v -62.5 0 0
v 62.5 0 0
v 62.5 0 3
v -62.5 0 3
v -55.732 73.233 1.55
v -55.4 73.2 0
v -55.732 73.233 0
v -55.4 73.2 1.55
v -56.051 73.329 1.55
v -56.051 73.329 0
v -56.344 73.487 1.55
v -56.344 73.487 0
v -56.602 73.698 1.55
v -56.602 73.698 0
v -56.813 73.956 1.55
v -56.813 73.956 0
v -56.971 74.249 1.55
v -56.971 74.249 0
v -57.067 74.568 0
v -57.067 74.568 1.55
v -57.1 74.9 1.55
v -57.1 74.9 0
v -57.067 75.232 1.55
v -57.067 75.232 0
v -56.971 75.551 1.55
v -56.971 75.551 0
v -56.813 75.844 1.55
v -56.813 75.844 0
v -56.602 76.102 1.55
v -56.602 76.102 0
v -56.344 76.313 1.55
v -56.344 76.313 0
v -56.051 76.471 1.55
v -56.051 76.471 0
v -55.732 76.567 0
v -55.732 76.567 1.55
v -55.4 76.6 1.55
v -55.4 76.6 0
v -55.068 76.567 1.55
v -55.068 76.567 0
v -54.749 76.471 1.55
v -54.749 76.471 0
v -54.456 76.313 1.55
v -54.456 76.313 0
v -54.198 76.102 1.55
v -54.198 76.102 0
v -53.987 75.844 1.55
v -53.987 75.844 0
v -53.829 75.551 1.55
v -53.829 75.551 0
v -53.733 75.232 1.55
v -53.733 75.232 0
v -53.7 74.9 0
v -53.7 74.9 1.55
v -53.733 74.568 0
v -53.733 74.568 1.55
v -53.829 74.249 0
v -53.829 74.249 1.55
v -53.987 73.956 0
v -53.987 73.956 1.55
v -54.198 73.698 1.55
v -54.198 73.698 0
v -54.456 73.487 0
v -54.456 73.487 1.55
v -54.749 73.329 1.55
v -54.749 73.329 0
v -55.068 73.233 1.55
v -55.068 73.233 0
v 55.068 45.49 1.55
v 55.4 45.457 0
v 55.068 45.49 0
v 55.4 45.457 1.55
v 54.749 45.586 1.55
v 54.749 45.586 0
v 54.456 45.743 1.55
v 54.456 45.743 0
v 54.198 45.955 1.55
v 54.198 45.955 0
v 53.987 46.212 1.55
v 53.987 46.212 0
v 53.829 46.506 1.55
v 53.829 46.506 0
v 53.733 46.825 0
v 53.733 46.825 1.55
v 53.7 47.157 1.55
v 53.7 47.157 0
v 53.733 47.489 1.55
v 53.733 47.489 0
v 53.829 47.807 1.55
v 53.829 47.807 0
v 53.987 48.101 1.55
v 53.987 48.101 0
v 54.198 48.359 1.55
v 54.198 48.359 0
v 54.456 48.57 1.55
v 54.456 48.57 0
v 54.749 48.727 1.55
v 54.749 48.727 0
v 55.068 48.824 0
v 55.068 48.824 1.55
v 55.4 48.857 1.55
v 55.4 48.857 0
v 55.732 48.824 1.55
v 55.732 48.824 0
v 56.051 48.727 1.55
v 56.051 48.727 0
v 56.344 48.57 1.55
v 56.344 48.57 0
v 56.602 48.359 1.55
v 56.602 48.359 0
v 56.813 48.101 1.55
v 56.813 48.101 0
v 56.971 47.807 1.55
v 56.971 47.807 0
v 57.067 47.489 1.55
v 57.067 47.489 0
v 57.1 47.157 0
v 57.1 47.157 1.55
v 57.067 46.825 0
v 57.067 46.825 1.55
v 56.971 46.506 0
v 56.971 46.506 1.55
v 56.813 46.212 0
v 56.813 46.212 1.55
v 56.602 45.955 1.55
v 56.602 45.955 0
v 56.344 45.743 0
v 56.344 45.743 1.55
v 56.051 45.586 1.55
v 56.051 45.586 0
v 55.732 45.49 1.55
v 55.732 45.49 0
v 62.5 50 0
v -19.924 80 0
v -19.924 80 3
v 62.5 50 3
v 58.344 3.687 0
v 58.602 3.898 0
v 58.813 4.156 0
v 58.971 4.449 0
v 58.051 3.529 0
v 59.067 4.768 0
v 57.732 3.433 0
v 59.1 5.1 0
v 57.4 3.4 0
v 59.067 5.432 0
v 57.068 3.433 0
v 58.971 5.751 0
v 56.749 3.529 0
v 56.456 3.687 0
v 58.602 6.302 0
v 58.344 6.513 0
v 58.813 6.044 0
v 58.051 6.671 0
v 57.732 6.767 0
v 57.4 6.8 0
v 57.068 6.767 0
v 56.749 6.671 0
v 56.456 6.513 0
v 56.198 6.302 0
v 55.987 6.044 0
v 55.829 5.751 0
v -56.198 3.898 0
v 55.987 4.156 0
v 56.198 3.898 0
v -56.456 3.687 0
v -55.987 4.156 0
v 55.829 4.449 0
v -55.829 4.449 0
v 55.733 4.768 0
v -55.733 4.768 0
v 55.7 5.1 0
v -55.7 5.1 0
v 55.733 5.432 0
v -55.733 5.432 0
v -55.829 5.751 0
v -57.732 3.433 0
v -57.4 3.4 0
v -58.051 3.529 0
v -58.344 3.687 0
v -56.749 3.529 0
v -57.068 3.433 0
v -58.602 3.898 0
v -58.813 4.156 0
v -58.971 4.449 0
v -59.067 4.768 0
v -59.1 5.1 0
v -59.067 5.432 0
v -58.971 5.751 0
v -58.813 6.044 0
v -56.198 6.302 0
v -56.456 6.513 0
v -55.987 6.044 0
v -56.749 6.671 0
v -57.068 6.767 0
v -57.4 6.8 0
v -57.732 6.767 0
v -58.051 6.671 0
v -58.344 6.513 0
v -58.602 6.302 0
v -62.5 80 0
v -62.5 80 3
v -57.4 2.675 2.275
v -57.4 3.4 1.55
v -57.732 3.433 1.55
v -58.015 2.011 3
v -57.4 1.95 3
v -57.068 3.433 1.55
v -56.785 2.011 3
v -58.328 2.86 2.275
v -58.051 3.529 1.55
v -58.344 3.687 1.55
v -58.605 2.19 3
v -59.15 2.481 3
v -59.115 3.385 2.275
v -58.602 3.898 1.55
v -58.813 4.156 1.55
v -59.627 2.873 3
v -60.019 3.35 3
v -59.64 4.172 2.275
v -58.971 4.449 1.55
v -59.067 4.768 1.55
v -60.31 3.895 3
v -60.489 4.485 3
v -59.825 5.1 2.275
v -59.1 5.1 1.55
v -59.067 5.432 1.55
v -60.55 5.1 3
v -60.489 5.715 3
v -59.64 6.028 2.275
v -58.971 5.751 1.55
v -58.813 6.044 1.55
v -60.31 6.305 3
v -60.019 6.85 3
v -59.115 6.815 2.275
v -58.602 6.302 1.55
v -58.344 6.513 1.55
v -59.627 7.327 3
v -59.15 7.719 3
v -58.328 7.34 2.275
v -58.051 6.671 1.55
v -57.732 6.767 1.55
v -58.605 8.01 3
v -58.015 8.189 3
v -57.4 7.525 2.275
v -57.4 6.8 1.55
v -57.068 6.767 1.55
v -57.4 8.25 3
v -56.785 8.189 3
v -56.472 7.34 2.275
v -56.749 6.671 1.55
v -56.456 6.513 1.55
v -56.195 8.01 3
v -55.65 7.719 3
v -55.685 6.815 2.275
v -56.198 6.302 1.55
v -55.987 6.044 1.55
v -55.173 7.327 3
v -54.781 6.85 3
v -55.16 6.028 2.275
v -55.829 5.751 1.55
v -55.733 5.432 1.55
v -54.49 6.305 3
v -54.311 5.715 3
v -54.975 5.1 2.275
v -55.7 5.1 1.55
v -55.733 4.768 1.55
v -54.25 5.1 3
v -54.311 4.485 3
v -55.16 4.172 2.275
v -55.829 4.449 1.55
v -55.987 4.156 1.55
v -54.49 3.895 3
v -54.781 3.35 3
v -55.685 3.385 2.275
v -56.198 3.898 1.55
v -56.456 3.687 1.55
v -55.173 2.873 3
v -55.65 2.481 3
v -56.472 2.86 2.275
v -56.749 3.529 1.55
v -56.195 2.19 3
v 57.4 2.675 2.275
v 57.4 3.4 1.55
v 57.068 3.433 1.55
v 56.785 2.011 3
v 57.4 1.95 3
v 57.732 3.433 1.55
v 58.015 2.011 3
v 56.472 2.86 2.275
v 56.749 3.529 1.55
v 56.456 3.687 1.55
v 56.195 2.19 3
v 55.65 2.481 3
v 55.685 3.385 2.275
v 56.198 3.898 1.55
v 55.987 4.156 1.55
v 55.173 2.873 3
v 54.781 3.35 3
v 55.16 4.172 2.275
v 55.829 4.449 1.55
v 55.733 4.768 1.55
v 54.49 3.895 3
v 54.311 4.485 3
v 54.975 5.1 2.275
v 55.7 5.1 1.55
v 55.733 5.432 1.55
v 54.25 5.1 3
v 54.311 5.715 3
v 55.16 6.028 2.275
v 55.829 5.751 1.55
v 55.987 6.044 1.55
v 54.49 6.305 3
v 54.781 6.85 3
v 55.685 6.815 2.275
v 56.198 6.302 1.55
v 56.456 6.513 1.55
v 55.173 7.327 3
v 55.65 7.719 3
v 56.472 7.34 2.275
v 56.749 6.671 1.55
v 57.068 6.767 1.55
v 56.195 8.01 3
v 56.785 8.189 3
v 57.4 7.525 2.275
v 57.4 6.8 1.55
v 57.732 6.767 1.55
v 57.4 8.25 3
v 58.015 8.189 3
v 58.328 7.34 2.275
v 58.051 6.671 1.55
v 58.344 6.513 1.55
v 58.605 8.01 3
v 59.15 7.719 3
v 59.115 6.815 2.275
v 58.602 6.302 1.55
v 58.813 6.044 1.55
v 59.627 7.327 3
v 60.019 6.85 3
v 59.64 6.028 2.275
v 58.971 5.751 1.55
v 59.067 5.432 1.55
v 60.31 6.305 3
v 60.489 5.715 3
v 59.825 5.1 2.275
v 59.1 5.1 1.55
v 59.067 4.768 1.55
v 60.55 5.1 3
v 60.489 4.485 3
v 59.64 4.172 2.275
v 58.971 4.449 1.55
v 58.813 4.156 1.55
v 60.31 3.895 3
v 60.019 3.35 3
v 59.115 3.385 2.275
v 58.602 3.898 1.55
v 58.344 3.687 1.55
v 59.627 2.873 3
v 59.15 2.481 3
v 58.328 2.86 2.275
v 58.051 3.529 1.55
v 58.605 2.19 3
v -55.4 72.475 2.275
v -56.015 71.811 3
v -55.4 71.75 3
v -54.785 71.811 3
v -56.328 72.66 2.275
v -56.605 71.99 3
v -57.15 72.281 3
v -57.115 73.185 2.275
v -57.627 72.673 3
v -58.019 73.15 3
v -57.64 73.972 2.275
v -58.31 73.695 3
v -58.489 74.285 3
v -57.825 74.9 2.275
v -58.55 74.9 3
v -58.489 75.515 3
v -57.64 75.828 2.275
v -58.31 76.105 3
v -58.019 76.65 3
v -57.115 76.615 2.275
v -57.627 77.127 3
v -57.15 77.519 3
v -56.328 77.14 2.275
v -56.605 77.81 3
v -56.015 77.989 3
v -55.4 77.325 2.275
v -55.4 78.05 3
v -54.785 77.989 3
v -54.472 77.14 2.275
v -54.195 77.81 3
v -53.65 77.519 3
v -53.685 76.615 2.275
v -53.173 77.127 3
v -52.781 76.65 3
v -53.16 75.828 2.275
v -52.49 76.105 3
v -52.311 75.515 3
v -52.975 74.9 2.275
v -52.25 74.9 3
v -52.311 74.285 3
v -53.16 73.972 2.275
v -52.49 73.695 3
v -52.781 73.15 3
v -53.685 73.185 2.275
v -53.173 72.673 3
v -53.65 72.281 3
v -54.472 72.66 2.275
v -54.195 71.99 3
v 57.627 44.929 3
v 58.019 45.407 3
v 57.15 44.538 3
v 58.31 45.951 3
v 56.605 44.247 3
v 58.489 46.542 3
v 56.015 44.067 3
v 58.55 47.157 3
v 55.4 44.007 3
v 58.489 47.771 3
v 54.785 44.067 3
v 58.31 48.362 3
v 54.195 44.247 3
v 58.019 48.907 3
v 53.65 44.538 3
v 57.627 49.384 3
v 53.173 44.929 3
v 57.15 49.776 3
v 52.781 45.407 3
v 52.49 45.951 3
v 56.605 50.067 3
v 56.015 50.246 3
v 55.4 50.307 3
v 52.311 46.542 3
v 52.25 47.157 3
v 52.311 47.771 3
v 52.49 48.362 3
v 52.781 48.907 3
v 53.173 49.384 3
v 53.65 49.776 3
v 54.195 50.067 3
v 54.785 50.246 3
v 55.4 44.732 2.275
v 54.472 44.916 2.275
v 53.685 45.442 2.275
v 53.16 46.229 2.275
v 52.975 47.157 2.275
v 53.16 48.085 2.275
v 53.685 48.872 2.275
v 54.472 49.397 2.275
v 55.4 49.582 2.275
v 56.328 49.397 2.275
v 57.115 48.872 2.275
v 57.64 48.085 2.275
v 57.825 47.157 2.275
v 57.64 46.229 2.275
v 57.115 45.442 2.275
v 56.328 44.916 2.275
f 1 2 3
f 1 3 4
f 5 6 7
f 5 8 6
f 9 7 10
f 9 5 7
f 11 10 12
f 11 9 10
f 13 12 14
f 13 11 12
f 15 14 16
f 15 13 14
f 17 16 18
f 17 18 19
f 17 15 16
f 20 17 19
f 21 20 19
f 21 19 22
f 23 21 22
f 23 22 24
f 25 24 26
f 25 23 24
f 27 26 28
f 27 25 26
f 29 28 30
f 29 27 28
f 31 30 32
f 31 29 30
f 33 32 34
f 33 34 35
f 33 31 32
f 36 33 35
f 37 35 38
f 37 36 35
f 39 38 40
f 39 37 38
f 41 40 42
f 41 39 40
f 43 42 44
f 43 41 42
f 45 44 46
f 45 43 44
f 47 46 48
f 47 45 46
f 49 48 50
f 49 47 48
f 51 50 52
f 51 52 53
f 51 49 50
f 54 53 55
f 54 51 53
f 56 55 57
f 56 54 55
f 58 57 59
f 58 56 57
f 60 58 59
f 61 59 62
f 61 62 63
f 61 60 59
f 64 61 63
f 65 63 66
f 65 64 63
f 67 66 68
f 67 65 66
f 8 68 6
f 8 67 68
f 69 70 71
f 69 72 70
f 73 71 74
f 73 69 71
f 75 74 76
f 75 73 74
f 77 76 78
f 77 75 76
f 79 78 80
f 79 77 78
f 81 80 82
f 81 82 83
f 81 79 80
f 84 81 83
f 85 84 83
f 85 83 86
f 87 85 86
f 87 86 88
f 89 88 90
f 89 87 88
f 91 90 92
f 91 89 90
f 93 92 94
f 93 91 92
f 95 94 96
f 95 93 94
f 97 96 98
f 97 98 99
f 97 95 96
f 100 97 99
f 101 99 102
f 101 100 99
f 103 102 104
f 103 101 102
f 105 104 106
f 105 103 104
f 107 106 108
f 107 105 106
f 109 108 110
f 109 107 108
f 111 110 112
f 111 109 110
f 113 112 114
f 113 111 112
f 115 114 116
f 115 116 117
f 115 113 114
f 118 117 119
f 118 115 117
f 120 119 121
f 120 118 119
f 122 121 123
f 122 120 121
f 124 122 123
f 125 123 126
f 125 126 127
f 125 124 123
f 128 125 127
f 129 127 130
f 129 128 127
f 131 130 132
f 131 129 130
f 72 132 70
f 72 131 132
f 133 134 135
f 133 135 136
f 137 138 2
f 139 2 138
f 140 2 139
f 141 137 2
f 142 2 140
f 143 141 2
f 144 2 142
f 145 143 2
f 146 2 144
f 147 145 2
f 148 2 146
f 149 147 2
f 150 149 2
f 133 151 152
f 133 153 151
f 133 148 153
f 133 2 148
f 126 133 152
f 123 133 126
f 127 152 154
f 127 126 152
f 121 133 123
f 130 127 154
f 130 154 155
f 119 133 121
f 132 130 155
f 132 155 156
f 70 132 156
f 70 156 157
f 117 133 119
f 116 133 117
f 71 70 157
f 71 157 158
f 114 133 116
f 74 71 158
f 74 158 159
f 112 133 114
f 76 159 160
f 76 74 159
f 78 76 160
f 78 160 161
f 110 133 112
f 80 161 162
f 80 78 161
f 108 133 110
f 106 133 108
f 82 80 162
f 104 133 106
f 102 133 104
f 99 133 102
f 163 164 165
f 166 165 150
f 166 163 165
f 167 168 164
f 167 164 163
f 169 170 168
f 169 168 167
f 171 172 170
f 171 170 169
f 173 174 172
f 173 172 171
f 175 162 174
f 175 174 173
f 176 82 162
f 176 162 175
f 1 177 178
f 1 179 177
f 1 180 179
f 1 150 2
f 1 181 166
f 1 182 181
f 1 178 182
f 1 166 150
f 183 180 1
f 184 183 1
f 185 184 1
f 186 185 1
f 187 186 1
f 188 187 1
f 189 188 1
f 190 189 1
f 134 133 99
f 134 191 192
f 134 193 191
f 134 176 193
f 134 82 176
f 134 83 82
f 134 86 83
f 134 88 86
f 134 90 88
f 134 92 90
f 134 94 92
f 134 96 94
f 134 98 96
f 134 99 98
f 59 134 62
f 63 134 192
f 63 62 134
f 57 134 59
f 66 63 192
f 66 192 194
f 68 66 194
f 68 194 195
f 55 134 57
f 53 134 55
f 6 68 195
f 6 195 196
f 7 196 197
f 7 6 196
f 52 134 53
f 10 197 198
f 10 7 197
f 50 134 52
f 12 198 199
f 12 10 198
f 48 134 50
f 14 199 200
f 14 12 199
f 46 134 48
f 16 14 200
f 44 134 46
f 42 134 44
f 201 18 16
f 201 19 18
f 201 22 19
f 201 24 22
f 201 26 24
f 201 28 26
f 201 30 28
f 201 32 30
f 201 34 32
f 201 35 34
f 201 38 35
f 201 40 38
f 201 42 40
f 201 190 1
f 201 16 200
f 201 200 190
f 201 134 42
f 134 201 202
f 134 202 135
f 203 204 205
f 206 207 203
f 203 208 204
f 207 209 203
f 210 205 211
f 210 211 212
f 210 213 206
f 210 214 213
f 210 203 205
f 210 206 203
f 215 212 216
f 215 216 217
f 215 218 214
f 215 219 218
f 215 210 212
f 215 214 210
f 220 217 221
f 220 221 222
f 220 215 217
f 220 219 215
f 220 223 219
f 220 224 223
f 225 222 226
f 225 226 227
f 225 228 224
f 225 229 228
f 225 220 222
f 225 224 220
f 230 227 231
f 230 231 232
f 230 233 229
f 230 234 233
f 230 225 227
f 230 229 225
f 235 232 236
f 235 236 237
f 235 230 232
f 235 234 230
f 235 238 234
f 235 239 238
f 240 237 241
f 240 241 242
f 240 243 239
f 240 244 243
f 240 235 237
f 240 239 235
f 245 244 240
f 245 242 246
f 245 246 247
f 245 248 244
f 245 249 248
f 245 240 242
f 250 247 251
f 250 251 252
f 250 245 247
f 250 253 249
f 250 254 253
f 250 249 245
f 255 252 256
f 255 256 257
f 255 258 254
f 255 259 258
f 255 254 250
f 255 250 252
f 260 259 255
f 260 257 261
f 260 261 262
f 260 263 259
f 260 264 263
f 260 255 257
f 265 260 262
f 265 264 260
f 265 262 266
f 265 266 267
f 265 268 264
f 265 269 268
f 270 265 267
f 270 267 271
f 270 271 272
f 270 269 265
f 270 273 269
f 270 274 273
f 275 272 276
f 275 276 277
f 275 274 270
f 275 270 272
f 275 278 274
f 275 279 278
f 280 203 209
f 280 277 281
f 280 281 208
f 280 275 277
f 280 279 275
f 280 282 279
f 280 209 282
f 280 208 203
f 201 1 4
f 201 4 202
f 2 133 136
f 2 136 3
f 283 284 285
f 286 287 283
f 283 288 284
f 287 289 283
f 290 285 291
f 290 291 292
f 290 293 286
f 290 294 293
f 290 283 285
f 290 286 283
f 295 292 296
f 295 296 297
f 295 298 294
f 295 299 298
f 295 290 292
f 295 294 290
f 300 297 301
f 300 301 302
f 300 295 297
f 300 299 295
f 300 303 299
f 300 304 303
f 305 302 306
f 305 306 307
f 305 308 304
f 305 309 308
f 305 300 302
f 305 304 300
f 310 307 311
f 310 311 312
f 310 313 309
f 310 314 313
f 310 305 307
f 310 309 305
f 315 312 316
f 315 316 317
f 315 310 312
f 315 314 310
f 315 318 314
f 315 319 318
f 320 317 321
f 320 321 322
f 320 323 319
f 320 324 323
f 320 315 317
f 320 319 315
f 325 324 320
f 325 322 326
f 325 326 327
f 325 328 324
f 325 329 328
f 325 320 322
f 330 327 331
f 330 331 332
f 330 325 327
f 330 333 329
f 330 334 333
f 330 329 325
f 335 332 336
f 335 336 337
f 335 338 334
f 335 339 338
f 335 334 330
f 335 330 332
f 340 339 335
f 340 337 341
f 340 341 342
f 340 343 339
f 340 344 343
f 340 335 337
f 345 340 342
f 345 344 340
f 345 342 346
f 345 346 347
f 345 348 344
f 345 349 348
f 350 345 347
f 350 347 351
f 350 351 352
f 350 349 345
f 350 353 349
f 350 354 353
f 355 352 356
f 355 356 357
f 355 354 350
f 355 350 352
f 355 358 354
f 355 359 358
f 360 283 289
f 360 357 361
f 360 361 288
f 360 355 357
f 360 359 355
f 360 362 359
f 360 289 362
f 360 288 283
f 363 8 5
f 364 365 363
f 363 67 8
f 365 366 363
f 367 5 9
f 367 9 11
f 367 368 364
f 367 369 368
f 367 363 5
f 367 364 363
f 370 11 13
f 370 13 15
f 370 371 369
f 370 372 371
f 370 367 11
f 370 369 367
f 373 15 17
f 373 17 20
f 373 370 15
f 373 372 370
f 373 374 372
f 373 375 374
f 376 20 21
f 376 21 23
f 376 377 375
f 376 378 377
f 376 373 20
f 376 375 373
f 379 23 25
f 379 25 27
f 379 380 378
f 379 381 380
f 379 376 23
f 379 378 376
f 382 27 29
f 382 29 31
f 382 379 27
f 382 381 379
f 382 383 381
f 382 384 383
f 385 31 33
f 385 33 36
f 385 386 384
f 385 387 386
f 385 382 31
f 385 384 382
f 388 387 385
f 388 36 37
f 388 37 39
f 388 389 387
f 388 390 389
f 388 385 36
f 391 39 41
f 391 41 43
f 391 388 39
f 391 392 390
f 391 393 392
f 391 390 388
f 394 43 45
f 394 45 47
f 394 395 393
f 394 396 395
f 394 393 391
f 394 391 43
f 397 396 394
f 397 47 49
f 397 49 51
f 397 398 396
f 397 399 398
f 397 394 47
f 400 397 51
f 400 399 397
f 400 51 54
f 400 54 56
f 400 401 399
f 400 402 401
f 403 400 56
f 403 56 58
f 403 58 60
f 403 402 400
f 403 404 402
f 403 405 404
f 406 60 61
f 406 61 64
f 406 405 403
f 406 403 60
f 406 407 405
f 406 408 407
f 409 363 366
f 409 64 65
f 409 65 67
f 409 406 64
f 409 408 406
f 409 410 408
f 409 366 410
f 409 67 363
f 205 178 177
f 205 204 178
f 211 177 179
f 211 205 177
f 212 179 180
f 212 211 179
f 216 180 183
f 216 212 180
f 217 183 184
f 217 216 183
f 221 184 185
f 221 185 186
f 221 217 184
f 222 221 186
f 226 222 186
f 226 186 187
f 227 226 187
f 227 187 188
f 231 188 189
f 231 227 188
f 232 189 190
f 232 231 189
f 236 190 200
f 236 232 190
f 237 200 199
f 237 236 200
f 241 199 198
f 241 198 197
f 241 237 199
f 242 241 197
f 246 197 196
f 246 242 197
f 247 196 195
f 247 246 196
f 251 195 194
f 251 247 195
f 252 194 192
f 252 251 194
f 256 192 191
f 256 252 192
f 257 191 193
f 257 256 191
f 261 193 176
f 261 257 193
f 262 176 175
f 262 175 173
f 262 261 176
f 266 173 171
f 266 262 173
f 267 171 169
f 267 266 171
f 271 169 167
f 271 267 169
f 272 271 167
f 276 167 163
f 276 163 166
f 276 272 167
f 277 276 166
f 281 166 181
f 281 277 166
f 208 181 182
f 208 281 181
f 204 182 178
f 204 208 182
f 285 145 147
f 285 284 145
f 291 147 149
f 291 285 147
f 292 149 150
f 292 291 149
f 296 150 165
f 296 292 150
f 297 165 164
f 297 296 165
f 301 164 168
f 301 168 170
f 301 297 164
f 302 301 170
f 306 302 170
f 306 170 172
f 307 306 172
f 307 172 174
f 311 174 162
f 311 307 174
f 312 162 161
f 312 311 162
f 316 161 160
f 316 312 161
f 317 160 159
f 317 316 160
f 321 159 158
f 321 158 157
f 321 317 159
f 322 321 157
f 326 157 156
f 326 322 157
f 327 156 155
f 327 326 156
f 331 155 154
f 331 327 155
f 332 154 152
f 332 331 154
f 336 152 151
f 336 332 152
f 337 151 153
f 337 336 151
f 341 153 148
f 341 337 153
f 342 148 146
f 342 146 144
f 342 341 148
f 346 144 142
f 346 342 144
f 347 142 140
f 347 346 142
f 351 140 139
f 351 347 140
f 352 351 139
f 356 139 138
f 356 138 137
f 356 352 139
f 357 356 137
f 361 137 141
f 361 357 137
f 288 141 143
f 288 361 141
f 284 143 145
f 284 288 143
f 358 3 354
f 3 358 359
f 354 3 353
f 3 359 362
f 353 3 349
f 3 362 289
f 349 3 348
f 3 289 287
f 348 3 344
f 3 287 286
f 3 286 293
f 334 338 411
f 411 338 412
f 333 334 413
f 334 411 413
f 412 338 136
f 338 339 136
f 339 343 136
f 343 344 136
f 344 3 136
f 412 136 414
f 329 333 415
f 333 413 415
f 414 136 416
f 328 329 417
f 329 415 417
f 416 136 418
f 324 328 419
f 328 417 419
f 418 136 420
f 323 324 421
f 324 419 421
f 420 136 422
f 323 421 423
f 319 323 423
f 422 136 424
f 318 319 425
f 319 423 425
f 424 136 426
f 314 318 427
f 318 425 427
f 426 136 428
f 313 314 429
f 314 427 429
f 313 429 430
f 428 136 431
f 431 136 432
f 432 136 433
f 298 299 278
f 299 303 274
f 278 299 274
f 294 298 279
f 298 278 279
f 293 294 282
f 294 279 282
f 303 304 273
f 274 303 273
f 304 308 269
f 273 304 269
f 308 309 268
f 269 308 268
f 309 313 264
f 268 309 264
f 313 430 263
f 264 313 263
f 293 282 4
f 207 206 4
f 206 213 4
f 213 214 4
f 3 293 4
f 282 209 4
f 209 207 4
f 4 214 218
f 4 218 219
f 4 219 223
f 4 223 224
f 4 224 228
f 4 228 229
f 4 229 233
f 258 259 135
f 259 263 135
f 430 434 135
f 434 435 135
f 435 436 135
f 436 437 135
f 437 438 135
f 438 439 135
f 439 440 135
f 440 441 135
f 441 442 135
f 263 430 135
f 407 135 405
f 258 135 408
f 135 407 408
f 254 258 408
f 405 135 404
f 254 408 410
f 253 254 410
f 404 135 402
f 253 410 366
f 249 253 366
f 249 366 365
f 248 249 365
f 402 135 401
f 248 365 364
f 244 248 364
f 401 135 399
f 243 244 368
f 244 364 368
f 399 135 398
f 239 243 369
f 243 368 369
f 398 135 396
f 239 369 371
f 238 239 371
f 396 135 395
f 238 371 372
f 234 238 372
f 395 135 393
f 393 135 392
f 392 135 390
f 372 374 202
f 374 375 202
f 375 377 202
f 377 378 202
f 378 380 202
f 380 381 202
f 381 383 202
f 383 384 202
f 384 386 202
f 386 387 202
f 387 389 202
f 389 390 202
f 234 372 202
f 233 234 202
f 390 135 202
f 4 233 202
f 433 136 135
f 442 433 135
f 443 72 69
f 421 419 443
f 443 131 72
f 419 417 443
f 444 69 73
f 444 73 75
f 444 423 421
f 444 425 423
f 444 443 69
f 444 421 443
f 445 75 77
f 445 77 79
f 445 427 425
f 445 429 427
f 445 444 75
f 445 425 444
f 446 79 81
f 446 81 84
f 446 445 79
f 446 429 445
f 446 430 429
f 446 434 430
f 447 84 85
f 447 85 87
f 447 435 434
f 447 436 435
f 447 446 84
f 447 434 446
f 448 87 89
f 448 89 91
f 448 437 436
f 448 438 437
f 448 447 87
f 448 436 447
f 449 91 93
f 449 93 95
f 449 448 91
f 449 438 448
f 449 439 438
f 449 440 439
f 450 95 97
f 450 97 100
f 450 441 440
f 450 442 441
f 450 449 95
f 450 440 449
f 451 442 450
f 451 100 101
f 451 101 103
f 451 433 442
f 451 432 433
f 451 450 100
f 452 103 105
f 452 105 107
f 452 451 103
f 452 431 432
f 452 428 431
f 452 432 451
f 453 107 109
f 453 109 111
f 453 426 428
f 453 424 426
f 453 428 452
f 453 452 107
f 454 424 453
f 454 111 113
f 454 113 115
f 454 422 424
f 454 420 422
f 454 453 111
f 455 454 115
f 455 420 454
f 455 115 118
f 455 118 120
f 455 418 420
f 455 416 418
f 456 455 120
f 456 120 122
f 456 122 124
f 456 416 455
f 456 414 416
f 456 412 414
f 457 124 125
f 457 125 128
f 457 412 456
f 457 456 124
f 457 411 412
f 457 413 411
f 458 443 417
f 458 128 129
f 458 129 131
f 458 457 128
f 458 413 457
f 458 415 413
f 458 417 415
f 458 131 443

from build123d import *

# Parameters (mm, degrees)
EXTRUDE_1_DEPTH            = 3
HOLE_WIZARD_M31_AT_2_COUNT = 2
HOLE_WIZARD_M31_AT_2_PITCH = 69.828647416
HOLE_WIZARD_M31_AT_3_COUNT = 2
HOLE_WIZARD_M31_AT_3_PITCH = 114.220491135
HOLE_WIZARD_M31_AT_4_COUNT = 2
HOLE_WIZARD_M31_AT_4_PITCH = 132.649462871


with BuildPart() as part:
    # Эскиз1 → Бобышка-Вытянуть1 (new body)
    with BuildSketch(Plane.XY):
        Polygon((-19.924322584, 80), (62.5, 50), (62.5, 0), (-62.5, 0), (-62.5, 80), align=None)
    extrude(amount=EXTRUDE_1_DEPTH)

    # Эскиз5 → Зенковка для винта с потайной головкой M31 (revolve, cut)
    with BuildSketch(Plane(origin=(-55.4, 74.9, 3), x_dir=(0, -1, 0), z_dir=(1, 0, 0))):
        Polygon((0, 0), (0, 3), (1.7, 3), (1.7, 1.45), (3.15, 0), align=None)
    hole_wizard_m31 = revolve(axis=Axis((-55.4, 74.9, 9.35), (0, 0, -1)), mode=Mode.SUBTRACT)

    # Зенковка для винта с потайной головкой M31 at 2: Зенковка для винта с потайной головкой M31 ×2
    with Locations(*[Vector(-0.02864154002689579, -0.9995897469386568, 0) * (i * HOLE_WIZARD_M31_AT_2_PITCH) for i in range(1, HOLE_WIZARD_M31_AT_2_COUNT)]):
        add(hole_wizard_m31, mode=Mode.SUBTRACT)

    # Зенковка для винта с потайной головкой M31 at 3: Зенковка для винта с потайной головкой M31 ×2
    with Locations(*[Vector(0.9700536120909078, -0.24289090075460365, 0) * (i * HOLE_WIZARD_M31_AT_3_PITCH) for i in range(1, HOLE_WIZARD_M31_AT_3_COUNT)]):
        add(hole_wizard_m31, mode=Mode.SUBTRACT)

    # Зенковка для винта с потайной головкой M31 at 4: Зенковка для винта с потайной головкой M31 ×2
    with Locations(*[Vector(0.8503615284864274, -0.5261988890811409, 0) * (i * HOLE_WIZARD_M31_AT_4_PITCH) for i in range(1, HOLE_WIZARD_M31_AT_4_COUNT)]):
        add(hole_wizard_m31, mode=Mode.SUBTRACT)


solid = part.part
